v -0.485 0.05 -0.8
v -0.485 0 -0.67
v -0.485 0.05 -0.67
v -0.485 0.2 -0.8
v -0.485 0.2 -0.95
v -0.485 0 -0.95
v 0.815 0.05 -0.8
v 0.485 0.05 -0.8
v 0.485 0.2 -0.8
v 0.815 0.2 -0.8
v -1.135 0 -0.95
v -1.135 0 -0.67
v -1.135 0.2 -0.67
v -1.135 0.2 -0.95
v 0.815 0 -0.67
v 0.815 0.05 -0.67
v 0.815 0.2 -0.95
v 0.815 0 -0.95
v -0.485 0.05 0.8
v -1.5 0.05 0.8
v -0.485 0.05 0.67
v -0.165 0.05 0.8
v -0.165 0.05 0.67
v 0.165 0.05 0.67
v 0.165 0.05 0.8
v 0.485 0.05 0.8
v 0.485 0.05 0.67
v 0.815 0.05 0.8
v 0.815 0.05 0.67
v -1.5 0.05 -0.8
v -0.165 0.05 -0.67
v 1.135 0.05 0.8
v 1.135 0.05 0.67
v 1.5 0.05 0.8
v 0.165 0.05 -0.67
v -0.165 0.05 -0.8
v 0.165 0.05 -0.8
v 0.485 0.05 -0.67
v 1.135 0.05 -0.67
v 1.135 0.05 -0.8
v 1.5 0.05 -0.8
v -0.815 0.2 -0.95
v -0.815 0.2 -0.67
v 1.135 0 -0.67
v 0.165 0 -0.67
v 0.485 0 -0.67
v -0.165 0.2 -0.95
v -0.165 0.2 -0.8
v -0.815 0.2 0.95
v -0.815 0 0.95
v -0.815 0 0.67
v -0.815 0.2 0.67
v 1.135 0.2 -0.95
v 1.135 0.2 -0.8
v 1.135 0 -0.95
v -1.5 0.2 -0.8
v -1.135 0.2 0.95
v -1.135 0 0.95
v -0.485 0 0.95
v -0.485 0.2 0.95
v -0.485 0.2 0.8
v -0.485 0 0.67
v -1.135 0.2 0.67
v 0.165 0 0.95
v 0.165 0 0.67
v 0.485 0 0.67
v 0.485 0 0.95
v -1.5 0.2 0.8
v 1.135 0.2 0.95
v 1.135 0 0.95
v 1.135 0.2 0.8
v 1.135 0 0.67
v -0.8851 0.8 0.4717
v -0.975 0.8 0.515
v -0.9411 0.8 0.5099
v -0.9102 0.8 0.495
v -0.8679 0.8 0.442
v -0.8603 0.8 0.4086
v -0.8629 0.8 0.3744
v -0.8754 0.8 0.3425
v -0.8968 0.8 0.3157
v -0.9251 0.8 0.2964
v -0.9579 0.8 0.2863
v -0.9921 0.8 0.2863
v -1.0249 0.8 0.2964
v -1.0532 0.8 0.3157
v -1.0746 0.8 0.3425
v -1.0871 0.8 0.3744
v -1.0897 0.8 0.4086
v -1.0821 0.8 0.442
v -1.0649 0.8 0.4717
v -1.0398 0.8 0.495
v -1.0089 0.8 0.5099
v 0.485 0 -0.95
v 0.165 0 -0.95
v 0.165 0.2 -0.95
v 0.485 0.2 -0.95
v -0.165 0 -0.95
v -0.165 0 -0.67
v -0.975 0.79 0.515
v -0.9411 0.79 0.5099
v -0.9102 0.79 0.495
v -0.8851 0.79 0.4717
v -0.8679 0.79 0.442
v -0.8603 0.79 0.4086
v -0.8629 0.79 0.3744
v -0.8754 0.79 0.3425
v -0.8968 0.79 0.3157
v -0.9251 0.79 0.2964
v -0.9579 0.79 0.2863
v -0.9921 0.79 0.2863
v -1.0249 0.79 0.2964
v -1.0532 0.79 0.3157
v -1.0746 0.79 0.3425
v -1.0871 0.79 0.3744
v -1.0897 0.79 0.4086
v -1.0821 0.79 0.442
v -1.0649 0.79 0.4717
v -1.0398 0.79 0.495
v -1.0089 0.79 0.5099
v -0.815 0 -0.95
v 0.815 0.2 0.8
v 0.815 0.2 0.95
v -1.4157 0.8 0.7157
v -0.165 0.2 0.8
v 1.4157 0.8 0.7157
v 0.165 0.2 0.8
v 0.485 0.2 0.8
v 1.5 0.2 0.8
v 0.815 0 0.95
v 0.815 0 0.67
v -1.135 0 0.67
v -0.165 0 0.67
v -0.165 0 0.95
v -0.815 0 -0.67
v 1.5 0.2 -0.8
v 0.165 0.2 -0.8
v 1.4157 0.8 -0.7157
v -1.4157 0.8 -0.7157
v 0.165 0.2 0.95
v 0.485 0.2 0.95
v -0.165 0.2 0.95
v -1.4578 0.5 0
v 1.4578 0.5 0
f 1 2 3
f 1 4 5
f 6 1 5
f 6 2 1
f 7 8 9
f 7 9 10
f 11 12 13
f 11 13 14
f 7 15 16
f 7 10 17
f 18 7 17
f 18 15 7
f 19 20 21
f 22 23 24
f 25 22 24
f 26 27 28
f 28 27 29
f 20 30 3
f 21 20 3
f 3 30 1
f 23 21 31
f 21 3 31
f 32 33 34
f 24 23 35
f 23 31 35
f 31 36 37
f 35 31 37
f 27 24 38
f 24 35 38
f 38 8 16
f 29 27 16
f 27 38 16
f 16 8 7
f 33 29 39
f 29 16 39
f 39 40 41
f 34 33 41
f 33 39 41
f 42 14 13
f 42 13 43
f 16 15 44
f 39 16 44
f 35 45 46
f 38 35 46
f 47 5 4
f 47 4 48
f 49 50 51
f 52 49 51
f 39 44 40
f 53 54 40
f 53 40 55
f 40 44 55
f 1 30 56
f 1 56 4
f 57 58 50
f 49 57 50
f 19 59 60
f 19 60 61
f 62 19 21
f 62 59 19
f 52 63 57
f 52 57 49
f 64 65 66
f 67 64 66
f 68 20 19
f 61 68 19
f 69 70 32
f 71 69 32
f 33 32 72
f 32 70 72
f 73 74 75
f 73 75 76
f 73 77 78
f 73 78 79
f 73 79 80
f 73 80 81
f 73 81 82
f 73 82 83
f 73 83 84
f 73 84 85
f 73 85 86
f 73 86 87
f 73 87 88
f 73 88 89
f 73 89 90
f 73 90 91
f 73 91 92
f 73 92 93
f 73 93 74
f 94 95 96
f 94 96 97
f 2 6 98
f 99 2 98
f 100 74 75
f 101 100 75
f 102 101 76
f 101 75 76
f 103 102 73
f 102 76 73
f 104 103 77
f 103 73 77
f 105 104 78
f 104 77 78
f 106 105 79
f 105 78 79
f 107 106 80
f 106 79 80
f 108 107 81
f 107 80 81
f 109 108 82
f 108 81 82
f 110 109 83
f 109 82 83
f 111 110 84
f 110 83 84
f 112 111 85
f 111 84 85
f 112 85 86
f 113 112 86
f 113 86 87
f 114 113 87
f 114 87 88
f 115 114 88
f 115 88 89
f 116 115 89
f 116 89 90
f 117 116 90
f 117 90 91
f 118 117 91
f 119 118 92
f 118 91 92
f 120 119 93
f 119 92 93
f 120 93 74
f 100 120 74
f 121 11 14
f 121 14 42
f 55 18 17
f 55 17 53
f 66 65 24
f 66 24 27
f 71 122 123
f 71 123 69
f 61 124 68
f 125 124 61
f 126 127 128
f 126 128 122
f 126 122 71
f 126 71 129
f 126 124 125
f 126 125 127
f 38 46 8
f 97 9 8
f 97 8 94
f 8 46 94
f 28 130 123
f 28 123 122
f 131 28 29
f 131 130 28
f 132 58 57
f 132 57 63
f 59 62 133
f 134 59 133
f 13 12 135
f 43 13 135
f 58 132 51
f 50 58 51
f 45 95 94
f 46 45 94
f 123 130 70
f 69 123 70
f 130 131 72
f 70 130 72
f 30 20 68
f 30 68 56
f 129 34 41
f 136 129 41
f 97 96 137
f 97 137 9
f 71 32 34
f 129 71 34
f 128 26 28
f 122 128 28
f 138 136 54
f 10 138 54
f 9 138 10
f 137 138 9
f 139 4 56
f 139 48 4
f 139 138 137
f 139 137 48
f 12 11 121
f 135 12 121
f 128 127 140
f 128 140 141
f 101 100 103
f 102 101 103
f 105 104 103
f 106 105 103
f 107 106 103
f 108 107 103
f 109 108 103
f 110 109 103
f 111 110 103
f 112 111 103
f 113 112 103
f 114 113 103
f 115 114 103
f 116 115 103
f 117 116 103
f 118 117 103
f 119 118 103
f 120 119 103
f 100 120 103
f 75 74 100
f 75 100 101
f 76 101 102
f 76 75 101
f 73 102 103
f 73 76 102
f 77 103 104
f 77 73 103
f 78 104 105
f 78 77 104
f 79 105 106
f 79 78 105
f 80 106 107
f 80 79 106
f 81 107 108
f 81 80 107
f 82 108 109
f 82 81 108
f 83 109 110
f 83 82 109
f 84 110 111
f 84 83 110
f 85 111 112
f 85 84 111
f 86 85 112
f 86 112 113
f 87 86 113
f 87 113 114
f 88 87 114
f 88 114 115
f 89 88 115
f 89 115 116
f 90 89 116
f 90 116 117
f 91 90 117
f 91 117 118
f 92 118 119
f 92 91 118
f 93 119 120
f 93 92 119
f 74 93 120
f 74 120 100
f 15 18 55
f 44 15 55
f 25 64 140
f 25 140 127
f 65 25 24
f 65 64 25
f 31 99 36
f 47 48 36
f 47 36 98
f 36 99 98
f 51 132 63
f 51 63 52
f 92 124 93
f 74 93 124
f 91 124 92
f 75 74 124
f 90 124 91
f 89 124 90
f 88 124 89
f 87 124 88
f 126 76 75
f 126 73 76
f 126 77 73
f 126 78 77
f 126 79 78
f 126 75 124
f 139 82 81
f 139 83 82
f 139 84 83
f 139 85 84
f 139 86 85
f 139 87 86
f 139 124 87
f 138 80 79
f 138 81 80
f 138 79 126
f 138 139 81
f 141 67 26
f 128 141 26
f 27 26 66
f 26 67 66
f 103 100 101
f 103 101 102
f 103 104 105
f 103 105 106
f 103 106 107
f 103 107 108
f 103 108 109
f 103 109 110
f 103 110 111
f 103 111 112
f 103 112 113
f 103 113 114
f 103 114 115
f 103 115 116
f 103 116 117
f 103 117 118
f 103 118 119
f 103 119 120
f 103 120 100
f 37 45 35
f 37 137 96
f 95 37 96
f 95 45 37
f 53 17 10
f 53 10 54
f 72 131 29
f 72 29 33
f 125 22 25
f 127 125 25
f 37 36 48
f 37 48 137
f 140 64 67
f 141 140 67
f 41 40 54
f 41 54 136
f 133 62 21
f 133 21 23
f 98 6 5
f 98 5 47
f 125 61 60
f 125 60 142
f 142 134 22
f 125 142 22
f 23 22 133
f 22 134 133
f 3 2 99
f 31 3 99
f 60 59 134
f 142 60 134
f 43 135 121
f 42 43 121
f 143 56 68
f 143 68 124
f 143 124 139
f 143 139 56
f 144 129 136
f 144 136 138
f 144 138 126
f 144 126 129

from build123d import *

# Parameters (mm, degrees)
EXTRUDE_START          = 0.05
SKETCH_1_W             = 3
SKETCH_1_H             = 1.6
EXTRUDE_1_DEPTH        = 0.15
EXTRUDE_START_2        = 0.2
SKETCH_2_W             = 3
SKETCH_2_H             = 1.6
EXTRUDE_2_DEPTH        = 0.6
EXTRUDE_2_TAPER        = 8
SKETCH_4_W             = 0.32
SKETCH_4_H             = 0.28
EXTRUDE_3_DEPTH        = 0.2
EXTRUDE_3_2_DEPTH      = 0.2
PATTERN_LINEAR_1_COUNT = 4
PATTERN_LINEAR_1_PITCH = 0.65
SKETCH_5_R             = 0.115
CUT_EXTRUDE_1_DEPTH    = 0.01
SKETCH_5_2_R           = 0.115
EXTRUDE_4_DEPTH        = 0.01


with BuildPart() as part:
    # Эскиз1 → Бобышка-Вытянуть1 (new body)
    with BuildSketch(Plane(origin=(0, 0, 0), x_dir=(1, 0, 0), z_dir=(0, 1, 0)).offset(EXTRUDE_START)):
        Rectangle(SKETCH_1_W, SKETCH_1_H)
    extrude(amount=EXTRUDE_1_DEPTH)

    # Эскиз2 → Бобышка-Вытянуть2 (add)
    with BuildSketch(Plane(origin=(0, 0, 0), x_dir=(1, 0, 0), z_dir=(0, 1, 0)).offset(EXTRUDE_START_2)):
        Rectangle(SKETCH_2_W, SKETCH_2_H)
    extrude(amount=EXTRUDE_2_DEPTH, taper=EXTRUDE_2_TAPER)


with BuildPart() as body_2:
    # Эскиз4 → Бобышка-Вытянуть3 (new body)
    with BuildSketch(Plane(origin=(0, 0, 0), x_dir=(1, 0, 0), z_dir=(0, 1, 0))):
        with Locations((-0.975, -0.81)):
            Rectangle(SKETCH_4_W, SKETCH_4_H)
    extrude_3 = extrude(amount=EXTRUDE_3_DEPTH)


with BuildPart() as body_3:
    # Эскиз4 → Extrude 3 2 (new body)
    with BuildSketch(Plane(origin=(0, 0, 0), x_dir=(1, 0, 0), z_dir=(0, 1, 0))):
        with Locations((-0.975, 0.81)):
            Rectangle(SKETCH_4_W, SKETCH_4_H)
    extrude_3_2 = extrude(amount=EXTRUDE_3_2_DEPTH)


with BuildPart() as part_1:
    add(part.part)

    # Линейный массив1: Бобышка-Вытянуть3, Extrude 3 2 ×4
    with Locations(*[(i * PATTERN_LINEAR_1_PITCH, 0, 0) for i in range(1, PATTERN_LINEAR_1_COUNT)]):
        add(extrude_3)
        add(extrude_3_2)

    # Эскиз5 → Вырез-Вытянуть1 (cut)
    with BuildSketch(Plane(origin=(0, 0.8, 0), x_dir=(1, 0, 0), z_dir=(0, 1, 0))):
        with Locations((-0.975, -0.4)):
            Circle(SKETCH_5_R)
    extrude(amount=-CUT_EXTRUDE_1_DEPTH, mode=Mode.SUBTRACT)


with BuildPart() as body_4:
    # Эскиз5<2> → Бобышка-Вытянуть4 (new body)
    with BuildSketch(Plane(origin=(0, 0.8, 0), x_dir=(1, 0, 0), z_dir=(0, 1, 0))):
        with Locations((-0.975, -0.4)):
            Circle(SKETCH_5_2_R)
    extrude(amount=-EXTRUDE_4_DEPTH)


solid = Compound([body_2.part, body_3.part, part_1.part, body_4.part])
